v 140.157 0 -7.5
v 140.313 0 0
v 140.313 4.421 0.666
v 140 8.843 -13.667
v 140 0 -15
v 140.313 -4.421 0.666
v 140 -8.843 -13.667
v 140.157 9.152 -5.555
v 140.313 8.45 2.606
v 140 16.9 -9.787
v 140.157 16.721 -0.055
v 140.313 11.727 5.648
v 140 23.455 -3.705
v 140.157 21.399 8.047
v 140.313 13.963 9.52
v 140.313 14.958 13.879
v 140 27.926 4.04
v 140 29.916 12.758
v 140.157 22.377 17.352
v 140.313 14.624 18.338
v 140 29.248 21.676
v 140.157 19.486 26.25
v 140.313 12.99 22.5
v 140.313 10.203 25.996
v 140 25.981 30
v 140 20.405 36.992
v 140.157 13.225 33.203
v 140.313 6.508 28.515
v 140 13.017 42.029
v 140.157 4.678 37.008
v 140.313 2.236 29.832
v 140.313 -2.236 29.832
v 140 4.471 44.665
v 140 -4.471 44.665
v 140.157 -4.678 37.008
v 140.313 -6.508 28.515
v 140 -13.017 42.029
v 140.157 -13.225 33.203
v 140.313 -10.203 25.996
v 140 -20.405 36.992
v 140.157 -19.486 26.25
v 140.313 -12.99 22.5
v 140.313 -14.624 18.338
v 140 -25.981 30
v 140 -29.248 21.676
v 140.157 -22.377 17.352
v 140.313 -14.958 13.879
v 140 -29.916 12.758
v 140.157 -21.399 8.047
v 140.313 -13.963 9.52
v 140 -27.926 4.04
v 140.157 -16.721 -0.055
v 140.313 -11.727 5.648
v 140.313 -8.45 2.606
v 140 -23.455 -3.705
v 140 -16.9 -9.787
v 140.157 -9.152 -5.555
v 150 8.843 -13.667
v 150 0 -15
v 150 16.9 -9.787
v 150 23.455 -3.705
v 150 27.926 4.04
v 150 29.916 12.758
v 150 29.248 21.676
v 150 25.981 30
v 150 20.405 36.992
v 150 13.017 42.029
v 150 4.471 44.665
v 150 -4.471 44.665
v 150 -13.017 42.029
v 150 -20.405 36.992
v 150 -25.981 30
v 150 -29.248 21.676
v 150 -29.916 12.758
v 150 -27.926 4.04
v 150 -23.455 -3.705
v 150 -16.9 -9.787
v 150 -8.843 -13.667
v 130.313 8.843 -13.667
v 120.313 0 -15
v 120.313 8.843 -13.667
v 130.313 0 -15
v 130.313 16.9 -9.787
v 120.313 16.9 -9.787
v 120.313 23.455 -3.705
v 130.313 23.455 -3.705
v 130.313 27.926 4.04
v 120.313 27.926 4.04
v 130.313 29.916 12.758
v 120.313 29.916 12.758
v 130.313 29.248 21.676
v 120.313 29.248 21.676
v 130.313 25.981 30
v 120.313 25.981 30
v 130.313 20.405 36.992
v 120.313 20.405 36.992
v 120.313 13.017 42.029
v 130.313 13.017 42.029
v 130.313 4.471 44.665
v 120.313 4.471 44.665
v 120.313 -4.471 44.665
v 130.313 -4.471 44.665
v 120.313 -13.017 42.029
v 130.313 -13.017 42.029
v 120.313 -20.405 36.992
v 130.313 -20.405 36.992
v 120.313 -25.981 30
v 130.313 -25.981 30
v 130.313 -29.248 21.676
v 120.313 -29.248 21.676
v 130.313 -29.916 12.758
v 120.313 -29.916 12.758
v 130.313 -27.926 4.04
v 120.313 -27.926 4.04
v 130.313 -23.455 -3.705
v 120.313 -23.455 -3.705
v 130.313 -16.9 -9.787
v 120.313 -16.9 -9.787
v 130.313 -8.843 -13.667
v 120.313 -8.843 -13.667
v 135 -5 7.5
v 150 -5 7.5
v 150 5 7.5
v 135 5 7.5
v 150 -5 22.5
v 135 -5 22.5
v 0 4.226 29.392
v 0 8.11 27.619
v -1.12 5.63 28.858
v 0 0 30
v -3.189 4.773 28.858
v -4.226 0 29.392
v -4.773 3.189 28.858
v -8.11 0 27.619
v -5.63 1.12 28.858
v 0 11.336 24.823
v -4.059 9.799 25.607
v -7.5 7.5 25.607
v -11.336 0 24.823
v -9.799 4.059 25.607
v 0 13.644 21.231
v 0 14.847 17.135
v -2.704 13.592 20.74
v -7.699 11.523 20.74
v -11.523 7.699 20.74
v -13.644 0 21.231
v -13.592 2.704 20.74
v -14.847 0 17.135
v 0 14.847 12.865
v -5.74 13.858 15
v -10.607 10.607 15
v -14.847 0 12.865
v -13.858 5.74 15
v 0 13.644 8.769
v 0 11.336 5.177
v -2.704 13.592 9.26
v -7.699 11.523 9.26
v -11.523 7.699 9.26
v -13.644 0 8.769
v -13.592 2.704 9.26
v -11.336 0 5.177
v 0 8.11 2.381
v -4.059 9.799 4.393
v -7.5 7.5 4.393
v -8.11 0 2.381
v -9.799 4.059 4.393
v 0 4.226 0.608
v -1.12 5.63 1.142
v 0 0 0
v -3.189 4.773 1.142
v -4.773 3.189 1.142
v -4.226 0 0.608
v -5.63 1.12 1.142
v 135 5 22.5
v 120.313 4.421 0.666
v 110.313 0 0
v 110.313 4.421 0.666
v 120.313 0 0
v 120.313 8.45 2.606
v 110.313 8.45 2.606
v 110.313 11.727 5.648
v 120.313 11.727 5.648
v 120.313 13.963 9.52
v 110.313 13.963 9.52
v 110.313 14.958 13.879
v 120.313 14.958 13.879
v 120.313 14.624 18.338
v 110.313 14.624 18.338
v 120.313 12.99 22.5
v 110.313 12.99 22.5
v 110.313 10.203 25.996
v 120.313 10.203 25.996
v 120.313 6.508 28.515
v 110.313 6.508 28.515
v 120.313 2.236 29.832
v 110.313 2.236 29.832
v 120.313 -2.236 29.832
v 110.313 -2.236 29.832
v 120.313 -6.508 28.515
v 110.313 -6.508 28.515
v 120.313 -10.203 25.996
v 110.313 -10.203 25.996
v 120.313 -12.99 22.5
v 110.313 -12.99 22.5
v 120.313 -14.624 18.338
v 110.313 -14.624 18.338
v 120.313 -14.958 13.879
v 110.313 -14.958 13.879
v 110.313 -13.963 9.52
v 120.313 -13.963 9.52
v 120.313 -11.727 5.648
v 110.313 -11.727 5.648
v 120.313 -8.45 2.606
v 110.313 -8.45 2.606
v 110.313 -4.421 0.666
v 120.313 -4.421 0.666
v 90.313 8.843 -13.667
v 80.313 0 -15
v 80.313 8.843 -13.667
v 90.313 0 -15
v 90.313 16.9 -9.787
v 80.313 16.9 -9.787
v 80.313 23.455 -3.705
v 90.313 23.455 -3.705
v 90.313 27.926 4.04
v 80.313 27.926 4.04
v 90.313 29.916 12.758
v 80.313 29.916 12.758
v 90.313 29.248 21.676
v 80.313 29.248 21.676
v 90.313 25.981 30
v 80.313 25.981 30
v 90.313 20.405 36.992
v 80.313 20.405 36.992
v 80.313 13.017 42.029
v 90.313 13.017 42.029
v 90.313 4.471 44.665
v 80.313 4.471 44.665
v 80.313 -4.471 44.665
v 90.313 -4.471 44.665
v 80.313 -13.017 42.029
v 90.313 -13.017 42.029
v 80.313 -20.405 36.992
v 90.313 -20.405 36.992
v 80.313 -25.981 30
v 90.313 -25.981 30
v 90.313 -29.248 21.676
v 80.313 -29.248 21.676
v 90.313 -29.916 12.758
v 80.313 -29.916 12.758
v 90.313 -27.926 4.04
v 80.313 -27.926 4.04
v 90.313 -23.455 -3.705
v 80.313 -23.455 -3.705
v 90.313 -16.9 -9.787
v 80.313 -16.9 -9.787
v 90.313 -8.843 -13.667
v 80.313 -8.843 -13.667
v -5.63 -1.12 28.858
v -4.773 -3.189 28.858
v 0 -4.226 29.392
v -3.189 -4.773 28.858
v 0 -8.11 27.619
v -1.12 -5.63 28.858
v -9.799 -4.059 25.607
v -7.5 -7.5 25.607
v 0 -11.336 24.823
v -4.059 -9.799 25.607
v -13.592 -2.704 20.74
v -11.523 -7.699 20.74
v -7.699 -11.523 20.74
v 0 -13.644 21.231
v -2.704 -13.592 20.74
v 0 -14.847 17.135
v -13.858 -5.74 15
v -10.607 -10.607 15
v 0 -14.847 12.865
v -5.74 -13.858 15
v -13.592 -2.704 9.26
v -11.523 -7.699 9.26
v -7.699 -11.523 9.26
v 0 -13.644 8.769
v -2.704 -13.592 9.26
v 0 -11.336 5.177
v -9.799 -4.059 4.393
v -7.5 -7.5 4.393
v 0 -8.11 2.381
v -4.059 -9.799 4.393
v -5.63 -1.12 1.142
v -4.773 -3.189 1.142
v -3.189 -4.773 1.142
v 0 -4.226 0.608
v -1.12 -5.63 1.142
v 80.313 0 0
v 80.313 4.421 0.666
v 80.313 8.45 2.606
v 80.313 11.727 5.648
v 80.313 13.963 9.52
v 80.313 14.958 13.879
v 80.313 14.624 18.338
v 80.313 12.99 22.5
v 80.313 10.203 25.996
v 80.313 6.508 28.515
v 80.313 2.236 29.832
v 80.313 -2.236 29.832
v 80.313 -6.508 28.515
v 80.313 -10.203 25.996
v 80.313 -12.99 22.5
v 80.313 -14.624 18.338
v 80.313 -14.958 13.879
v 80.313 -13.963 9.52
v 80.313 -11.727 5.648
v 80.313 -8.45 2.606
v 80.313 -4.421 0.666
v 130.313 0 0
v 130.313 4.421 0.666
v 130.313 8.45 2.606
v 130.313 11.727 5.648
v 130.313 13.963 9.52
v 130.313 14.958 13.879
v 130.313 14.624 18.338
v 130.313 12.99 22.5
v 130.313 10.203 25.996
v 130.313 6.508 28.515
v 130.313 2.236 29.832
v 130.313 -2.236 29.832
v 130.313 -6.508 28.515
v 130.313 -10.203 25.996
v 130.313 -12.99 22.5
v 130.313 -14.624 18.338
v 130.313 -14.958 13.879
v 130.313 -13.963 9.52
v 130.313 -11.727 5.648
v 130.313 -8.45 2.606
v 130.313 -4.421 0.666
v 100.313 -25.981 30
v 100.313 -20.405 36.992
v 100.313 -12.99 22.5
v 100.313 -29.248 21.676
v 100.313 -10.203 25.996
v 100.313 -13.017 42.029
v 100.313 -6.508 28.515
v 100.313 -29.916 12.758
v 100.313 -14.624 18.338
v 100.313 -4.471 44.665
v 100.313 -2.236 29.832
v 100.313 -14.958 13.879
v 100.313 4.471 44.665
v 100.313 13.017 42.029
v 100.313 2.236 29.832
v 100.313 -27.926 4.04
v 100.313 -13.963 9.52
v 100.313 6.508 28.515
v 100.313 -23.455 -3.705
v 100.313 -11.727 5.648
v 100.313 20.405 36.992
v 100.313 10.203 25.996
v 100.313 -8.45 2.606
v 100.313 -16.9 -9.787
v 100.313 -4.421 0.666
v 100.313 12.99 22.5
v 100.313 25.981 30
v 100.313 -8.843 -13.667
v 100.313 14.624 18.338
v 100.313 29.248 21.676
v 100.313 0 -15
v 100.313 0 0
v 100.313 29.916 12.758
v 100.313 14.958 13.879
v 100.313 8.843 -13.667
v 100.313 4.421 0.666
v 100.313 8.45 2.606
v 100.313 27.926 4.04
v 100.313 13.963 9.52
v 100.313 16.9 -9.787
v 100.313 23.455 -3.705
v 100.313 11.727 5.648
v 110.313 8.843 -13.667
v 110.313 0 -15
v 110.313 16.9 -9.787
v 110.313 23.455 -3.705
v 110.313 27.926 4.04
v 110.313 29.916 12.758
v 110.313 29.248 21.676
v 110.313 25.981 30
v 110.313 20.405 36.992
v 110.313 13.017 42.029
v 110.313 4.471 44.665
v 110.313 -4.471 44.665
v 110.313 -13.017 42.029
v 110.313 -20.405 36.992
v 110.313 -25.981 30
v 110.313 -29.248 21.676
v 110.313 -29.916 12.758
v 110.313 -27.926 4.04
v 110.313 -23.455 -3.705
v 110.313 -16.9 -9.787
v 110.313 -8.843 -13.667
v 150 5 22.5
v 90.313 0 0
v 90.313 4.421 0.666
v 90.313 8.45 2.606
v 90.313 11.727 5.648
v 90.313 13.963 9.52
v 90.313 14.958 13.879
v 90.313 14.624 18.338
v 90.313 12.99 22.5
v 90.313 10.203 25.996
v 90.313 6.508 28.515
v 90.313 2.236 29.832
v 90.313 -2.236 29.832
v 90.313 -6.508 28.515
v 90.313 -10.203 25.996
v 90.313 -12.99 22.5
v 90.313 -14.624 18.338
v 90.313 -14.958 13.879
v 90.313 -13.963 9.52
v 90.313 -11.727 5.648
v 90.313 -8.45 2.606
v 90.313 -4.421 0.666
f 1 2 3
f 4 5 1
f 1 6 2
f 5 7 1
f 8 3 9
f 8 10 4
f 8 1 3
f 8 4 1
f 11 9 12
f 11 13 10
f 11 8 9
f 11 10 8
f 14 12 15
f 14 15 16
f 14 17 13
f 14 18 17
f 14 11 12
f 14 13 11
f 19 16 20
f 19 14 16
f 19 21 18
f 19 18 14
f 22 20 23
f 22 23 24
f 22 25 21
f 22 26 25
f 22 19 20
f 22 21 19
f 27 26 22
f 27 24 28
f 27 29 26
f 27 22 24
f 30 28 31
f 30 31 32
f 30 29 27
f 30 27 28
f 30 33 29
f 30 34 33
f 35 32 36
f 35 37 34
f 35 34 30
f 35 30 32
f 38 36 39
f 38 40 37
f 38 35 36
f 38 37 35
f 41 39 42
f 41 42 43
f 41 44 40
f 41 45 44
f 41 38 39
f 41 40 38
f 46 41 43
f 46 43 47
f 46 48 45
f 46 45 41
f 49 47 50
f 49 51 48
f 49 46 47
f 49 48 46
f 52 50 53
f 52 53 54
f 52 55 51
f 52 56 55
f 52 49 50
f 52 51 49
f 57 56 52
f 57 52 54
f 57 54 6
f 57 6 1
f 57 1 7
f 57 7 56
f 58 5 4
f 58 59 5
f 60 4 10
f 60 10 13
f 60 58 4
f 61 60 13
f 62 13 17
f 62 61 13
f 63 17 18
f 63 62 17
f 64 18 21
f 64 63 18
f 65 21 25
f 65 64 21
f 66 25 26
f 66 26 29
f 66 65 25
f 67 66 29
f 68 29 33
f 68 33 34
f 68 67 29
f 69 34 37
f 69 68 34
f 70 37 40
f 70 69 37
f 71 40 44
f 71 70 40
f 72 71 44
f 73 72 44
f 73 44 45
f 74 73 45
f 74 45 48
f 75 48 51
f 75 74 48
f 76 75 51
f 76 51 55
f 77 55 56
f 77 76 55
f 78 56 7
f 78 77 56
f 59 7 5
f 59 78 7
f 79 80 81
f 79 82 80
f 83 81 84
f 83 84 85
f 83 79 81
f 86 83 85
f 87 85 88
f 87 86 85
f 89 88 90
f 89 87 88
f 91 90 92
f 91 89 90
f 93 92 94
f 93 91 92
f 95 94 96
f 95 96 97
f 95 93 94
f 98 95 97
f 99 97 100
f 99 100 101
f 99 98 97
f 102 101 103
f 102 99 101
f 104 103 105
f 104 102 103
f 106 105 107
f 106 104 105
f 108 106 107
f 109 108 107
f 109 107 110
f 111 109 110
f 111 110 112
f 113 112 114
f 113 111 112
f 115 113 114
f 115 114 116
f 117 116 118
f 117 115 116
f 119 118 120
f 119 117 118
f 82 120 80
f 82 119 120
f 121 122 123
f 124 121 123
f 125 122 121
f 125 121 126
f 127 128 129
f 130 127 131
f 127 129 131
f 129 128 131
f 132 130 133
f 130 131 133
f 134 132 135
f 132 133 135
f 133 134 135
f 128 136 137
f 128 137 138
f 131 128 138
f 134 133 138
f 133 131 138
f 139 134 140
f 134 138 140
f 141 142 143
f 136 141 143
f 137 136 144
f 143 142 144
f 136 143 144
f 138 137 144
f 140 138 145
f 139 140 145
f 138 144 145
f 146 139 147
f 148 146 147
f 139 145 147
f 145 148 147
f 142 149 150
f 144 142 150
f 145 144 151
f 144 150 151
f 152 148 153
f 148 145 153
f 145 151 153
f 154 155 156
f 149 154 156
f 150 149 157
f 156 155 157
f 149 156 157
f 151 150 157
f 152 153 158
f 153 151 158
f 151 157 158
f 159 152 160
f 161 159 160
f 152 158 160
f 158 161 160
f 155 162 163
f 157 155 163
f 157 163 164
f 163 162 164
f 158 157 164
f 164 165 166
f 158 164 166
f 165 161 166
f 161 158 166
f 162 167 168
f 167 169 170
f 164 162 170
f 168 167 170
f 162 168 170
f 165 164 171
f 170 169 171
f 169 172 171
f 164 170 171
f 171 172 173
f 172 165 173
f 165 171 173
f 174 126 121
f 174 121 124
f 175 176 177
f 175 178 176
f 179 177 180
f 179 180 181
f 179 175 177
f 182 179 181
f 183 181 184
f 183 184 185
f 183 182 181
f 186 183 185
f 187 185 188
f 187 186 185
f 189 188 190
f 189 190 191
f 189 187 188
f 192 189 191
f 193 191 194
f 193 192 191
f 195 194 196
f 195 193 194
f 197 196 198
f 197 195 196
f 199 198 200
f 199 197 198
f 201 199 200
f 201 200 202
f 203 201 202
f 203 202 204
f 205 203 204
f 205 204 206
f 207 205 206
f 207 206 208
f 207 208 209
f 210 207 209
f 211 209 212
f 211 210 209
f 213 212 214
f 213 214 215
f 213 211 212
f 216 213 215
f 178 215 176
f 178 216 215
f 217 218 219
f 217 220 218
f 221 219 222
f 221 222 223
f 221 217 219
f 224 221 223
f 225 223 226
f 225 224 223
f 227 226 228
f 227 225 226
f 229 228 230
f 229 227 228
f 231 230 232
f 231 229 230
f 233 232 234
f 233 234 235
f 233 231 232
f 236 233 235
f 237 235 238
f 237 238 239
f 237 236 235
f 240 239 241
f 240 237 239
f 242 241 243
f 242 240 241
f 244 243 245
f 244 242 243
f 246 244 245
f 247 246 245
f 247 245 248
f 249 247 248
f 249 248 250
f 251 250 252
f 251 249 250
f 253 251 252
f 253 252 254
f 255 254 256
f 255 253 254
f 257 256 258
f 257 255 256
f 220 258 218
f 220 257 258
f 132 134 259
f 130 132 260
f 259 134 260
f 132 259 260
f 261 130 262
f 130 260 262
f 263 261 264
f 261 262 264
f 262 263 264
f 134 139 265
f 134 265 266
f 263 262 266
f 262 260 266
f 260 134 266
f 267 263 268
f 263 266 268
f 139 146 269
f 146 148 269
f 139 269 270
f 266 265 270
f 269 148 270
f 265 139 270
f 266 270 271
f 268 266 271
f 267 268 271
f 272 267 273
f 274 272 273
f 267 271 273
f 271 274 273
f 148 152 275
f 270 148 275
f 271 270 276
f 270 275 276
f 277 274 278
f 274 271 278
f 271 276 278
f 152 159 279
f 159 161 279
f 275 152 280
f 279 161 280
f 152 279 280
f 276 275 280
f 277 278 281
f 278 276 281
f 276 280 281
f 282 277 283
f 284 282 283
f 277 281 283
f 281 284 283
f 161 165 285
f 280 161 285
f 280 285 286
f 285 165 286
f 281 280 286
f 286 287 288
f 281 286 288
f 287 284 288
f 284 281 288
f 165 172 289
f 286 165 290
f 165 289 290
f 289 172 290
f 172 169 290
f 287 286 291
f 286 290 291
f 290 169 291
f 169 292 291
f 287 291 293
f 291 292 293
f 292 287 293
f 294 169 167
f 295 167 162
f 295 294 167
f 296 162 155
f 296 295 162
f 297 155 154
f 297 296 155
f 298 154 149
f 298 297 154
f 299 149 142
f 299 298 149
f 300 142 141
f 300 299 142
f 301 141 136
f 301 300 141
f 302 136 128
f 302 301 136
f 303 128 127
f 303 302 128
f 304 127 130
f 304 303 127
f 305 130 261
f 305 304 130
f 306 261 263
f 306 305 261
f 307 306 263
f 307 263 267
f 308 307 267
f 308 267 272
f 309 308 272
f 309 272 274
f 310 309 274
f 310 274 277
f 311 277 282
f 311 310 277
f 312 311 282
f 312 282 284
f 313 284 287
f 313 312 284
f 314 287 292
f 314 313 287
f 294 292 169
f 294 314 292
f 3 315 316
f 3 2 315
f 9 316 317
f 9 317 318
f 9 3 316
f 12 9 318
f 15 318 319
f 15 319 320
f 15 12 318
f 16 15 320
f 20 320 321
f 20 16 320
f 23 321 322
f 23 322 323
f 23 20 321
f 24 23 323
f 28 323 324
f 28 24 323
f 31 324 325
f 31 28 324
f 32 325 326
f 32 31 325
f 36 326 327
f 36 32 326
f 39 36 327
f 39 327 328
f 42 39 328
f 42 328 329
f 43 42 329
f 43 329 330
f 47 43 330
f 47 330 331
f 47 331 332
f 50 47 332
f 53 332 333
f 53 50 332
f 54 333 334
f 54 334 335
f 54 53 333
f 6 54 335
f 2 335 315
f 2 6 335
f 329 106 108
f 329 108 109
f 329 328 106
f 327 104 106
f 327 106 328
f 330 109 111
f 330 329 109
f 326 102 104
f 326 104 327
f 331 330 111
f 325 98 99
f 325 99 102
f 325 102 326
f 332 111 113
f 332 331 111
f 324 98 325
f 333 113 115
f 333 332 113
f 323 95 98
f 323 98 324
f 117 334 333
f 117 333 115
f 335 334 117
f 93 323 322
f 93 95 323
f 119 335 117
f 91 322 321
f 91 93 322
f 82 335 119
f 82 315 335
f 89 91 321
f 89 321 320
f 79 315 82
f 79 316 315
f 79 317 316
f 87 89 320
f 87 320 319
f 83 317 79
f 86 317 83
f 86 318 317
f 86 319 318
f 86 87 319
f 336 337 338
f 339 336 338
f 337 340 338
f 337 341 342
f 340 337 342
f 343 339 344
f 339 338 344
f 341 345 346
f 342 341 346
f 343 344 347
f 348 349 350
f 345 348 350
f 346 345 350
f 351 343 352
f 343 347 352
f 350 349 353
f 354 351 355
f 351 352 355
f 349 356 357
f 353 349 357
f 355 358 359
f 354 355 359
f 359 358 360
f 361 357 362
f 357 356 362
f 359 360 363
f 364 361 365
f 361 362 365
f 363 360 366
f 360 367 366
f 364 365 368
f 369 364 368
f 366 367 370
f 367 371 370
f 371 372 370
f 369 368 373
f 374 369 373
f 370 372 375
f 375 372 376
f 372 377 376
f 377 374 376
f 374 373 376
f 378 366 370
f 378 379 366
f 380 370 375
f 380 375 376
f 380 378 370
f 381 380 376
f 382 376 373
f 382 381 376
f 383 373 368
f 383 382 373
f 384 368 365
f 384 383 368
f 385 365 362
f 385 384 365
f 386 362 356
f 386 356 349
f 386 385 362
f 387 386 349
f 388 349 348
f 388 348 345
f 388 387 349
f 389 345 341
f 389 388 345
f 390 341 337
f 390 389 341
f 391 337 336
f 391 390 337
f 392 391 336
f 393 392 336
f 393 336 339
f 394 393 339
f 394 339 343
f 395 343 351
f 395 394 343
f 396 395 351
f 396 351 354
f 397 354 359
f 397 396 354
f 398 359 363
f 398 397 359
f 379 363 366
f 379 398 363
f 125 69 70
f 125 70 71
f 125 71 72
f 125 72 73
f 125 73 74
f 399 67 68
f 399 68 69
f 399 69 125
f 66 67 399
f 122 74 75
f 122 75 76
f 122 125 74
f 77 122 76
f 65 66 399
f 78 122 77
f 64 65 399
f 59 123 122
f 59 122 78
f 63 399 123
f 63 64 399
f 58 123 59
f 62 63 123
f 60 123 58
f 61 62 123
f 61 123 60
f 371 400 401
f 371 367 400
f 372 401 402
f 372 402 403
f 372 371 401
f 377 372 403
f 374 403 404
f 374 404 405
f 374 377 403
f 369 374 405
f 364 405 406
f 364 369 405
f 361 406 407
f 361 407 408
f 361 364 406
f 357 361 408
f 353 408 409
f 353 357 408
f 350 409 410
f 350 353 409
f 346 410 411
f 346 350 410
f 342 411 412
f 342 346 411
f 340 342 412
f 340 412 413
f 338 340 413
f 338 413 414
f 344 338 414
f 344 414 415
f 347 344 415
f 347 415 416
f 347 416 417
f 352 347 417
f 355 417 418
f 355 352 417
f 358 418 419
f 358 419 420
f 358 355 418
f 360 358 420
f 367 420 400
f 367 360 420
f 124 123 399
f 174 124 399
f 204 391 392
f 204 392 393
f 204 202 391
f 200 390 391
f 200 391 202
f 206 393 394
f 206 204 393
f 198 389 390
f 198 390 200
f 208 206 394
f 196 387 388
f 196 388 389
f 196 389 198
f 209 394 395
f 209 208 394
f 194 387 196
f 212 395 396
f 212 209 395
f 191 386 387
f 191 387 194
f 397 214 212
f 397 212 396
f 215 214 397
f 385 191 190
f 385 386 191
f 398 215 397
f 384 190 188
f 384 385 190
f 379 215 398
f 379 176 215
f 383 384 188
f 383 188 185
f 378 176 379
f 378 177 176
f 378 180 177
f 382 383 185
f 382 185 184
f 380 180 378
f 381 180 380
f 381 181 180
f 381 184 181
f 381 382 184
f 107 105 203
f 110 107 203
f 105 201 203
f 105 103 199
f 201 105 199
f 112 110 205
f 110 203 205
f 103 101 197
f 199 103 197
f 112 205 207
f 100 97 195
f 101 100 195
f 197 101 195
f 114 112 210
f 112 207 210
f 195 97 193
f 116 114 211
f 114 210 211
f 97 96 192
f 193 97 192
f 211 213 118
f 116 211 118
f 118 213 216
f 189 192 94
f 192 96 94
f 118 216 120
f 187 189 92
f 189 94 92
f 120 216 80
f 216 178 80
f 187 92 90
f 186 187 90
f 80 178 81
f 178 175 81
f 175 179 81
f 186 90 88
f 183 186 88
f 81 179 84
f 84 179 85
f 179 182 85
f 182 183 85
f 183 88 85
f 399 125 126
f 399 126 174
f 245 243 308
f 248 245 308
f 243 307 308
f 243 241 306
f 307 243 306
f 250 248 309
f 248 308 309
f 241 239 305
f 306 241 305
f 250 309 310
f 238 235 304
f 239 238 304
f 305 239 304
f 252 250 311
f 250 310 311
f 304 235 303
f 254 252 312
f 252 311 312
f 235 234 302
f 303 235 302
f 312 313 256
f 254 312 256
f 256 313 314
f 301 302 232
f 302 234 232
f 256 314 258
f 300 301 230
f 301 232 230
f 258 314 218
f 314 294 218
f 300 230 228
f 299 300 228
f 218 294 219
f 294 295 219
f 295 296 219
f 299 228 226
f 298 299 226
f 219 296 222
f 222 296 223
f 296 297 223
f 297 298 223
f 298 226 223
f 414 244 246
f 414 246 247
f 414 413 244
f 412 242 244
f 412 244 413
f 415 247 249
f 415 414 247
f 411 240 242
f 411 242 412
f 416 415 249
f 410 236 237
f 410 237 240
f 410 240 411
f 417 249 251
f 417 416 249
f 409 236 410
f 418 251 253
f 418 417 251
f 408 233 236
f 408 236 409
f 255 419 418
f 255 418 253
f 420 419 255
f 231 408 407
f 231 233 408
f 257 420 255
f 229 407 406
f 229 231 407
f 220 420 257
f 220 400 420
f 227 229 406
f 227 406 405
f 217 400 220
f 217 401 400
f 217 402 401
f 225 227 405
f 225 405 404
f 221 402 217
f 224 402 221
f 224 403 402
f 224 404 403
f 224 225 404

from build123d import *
from build123d import SkipClean  # not in build123d's __all__

# Parameters (mm, degrees)
F1_W     = 10
F1_H     = 15
F3_W     = 10
F3_H     = 15
F5_DEPTH = 15


with BuildPart() as f2:
    # F1 (on Front) → F2 (revolve)
    with BuildSketch(Plane.XZ):
        Polygon((150, -15), (150, 0), (140.3131330013, 0), (140, -15), align=None)
        Polygon((138.0902081728, 15), (0, 15), (0, 0), (80.3131330013, 0), (90.3131330013, 0), (100.3131330013, 0), (110.3131330013, 0), (120.3131330013, 0), (130.3131330013, 0), (140.3131330013, 0), (150, 0), (150, 15), align=None)
        with Locations((125.3131330013, -7.5)):
            Rectangle(F1_W, F1_H)
        with Locations((105.3131330013, -7.5)):
            Rectangle(F1_W, F1_H)
        with Locations((85.3131330013, -7.5)):
            Rectangle(F1_W, F1_H)
    revolve(axis=Axis((75, 0, 15), (1, 0, 0)))

    # F0 (on Front) → F4 (revolve)
    with BuildSketch(Plane.XZ):
        with BuildLine():
            ThreePointArc((0, 30), (-15, 15), (0, 0))
            Line((0, 0), (0, 30))
        make_face()
    with SkipClean():  # cleaning this boolean's faces spoils the solid; the shape is the same uncleaned
        revolve(axis=Axis((0, 0, 15), (0, 0, 1)))

    # F3 (on face) → F5 (cut)
    with BuildSketch(Plane.YZ.offset(150)):
        with Locations((0, 15)):
            Rectangle(F3_W, F3_H)
    with SkipClean():  # cleaning this boolean's faces spoils the solid; the shape is the same uncleaned
        extrude(amount=-F5_DEPTH, mode=Mode.SUBTRACT)


solid = f2.part
